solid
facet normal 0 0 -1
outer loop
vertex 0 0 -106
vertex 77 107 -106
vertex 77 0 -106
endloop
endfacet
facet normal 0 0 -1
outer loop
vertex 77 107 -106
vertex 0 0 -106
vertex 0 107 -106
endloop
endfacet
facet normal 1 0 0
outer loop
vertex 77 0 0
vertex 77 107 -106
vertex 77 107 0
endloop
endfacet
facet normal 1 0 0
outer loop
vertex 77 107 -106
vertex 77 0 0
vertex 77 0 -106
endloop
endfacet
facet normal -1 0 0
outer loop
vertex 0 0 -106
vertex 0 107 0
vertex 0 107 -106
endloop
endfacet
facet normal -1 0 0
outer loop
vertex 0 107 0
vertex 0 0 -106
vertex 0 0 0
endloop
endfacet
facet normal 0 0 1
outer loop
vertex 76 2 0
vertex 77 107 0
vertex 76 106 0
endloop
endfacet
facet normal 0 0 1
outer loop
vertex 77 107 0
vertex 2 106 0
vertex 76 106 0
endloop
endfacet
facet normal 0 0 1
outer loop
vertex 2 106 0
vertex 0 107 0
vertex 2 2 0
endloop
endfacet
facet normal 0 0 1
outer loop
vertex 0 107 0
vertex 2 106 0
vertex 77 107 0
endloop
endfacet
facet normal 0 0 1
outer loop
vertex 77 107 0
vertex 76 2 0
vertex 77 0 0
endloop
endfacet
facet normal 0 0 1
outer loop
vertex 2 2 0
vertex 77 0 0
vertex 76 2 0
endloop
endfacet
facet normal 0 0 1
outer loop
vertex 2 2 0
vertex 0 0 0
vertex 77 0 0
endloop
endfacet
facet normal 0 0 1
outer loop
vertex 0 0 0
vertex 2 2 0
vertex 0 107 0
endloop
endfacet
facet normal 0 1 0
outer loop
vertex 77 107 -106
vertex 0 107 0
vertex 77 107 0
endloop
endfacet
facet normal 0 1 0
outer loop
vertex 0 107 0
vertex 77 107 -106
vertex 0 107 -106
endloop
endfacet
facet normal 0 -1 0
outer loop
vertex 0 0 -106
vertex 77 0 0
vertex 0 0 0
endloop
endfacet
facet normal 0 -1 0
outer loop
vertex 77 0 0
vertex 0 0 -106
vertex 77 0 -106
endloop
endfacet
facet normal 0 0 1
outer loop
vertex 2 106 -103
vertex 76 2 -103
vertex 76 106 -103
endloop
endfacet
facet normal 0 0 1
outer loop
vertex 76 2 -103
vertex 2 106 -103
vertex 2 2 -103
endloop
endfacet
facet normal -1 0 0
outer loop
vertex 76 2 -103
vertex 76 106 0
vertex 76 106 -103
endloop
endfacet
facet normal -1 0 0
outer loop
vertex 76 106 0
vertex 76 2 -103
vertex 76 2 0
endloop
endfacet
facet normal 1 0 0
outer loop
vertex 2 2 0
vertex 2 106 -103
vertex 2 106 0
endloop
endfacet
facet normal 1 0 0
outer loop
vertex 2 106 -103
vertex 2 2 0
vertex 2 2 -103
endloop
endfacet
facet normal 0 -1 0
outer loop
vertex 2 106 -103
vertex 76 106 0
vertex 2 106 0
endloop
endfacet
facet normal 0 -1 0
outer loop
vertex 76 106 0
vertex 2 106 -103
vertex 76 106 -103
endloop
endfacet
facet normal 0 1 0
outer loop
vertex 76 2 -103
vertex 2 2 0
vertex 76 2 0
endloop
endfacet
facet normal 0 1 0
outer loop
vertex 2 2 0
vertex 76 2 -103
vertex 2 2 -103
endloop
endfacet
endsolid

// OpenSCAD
module outer(){
    cube([106,107,77],center=false);}

module inner(){
    translate([0,2,2])
    cube([103,104,74],center=false);}

module diff(){
    rotate(a=[0,90,0])
    difference(){outer();inner();}}
diff();
